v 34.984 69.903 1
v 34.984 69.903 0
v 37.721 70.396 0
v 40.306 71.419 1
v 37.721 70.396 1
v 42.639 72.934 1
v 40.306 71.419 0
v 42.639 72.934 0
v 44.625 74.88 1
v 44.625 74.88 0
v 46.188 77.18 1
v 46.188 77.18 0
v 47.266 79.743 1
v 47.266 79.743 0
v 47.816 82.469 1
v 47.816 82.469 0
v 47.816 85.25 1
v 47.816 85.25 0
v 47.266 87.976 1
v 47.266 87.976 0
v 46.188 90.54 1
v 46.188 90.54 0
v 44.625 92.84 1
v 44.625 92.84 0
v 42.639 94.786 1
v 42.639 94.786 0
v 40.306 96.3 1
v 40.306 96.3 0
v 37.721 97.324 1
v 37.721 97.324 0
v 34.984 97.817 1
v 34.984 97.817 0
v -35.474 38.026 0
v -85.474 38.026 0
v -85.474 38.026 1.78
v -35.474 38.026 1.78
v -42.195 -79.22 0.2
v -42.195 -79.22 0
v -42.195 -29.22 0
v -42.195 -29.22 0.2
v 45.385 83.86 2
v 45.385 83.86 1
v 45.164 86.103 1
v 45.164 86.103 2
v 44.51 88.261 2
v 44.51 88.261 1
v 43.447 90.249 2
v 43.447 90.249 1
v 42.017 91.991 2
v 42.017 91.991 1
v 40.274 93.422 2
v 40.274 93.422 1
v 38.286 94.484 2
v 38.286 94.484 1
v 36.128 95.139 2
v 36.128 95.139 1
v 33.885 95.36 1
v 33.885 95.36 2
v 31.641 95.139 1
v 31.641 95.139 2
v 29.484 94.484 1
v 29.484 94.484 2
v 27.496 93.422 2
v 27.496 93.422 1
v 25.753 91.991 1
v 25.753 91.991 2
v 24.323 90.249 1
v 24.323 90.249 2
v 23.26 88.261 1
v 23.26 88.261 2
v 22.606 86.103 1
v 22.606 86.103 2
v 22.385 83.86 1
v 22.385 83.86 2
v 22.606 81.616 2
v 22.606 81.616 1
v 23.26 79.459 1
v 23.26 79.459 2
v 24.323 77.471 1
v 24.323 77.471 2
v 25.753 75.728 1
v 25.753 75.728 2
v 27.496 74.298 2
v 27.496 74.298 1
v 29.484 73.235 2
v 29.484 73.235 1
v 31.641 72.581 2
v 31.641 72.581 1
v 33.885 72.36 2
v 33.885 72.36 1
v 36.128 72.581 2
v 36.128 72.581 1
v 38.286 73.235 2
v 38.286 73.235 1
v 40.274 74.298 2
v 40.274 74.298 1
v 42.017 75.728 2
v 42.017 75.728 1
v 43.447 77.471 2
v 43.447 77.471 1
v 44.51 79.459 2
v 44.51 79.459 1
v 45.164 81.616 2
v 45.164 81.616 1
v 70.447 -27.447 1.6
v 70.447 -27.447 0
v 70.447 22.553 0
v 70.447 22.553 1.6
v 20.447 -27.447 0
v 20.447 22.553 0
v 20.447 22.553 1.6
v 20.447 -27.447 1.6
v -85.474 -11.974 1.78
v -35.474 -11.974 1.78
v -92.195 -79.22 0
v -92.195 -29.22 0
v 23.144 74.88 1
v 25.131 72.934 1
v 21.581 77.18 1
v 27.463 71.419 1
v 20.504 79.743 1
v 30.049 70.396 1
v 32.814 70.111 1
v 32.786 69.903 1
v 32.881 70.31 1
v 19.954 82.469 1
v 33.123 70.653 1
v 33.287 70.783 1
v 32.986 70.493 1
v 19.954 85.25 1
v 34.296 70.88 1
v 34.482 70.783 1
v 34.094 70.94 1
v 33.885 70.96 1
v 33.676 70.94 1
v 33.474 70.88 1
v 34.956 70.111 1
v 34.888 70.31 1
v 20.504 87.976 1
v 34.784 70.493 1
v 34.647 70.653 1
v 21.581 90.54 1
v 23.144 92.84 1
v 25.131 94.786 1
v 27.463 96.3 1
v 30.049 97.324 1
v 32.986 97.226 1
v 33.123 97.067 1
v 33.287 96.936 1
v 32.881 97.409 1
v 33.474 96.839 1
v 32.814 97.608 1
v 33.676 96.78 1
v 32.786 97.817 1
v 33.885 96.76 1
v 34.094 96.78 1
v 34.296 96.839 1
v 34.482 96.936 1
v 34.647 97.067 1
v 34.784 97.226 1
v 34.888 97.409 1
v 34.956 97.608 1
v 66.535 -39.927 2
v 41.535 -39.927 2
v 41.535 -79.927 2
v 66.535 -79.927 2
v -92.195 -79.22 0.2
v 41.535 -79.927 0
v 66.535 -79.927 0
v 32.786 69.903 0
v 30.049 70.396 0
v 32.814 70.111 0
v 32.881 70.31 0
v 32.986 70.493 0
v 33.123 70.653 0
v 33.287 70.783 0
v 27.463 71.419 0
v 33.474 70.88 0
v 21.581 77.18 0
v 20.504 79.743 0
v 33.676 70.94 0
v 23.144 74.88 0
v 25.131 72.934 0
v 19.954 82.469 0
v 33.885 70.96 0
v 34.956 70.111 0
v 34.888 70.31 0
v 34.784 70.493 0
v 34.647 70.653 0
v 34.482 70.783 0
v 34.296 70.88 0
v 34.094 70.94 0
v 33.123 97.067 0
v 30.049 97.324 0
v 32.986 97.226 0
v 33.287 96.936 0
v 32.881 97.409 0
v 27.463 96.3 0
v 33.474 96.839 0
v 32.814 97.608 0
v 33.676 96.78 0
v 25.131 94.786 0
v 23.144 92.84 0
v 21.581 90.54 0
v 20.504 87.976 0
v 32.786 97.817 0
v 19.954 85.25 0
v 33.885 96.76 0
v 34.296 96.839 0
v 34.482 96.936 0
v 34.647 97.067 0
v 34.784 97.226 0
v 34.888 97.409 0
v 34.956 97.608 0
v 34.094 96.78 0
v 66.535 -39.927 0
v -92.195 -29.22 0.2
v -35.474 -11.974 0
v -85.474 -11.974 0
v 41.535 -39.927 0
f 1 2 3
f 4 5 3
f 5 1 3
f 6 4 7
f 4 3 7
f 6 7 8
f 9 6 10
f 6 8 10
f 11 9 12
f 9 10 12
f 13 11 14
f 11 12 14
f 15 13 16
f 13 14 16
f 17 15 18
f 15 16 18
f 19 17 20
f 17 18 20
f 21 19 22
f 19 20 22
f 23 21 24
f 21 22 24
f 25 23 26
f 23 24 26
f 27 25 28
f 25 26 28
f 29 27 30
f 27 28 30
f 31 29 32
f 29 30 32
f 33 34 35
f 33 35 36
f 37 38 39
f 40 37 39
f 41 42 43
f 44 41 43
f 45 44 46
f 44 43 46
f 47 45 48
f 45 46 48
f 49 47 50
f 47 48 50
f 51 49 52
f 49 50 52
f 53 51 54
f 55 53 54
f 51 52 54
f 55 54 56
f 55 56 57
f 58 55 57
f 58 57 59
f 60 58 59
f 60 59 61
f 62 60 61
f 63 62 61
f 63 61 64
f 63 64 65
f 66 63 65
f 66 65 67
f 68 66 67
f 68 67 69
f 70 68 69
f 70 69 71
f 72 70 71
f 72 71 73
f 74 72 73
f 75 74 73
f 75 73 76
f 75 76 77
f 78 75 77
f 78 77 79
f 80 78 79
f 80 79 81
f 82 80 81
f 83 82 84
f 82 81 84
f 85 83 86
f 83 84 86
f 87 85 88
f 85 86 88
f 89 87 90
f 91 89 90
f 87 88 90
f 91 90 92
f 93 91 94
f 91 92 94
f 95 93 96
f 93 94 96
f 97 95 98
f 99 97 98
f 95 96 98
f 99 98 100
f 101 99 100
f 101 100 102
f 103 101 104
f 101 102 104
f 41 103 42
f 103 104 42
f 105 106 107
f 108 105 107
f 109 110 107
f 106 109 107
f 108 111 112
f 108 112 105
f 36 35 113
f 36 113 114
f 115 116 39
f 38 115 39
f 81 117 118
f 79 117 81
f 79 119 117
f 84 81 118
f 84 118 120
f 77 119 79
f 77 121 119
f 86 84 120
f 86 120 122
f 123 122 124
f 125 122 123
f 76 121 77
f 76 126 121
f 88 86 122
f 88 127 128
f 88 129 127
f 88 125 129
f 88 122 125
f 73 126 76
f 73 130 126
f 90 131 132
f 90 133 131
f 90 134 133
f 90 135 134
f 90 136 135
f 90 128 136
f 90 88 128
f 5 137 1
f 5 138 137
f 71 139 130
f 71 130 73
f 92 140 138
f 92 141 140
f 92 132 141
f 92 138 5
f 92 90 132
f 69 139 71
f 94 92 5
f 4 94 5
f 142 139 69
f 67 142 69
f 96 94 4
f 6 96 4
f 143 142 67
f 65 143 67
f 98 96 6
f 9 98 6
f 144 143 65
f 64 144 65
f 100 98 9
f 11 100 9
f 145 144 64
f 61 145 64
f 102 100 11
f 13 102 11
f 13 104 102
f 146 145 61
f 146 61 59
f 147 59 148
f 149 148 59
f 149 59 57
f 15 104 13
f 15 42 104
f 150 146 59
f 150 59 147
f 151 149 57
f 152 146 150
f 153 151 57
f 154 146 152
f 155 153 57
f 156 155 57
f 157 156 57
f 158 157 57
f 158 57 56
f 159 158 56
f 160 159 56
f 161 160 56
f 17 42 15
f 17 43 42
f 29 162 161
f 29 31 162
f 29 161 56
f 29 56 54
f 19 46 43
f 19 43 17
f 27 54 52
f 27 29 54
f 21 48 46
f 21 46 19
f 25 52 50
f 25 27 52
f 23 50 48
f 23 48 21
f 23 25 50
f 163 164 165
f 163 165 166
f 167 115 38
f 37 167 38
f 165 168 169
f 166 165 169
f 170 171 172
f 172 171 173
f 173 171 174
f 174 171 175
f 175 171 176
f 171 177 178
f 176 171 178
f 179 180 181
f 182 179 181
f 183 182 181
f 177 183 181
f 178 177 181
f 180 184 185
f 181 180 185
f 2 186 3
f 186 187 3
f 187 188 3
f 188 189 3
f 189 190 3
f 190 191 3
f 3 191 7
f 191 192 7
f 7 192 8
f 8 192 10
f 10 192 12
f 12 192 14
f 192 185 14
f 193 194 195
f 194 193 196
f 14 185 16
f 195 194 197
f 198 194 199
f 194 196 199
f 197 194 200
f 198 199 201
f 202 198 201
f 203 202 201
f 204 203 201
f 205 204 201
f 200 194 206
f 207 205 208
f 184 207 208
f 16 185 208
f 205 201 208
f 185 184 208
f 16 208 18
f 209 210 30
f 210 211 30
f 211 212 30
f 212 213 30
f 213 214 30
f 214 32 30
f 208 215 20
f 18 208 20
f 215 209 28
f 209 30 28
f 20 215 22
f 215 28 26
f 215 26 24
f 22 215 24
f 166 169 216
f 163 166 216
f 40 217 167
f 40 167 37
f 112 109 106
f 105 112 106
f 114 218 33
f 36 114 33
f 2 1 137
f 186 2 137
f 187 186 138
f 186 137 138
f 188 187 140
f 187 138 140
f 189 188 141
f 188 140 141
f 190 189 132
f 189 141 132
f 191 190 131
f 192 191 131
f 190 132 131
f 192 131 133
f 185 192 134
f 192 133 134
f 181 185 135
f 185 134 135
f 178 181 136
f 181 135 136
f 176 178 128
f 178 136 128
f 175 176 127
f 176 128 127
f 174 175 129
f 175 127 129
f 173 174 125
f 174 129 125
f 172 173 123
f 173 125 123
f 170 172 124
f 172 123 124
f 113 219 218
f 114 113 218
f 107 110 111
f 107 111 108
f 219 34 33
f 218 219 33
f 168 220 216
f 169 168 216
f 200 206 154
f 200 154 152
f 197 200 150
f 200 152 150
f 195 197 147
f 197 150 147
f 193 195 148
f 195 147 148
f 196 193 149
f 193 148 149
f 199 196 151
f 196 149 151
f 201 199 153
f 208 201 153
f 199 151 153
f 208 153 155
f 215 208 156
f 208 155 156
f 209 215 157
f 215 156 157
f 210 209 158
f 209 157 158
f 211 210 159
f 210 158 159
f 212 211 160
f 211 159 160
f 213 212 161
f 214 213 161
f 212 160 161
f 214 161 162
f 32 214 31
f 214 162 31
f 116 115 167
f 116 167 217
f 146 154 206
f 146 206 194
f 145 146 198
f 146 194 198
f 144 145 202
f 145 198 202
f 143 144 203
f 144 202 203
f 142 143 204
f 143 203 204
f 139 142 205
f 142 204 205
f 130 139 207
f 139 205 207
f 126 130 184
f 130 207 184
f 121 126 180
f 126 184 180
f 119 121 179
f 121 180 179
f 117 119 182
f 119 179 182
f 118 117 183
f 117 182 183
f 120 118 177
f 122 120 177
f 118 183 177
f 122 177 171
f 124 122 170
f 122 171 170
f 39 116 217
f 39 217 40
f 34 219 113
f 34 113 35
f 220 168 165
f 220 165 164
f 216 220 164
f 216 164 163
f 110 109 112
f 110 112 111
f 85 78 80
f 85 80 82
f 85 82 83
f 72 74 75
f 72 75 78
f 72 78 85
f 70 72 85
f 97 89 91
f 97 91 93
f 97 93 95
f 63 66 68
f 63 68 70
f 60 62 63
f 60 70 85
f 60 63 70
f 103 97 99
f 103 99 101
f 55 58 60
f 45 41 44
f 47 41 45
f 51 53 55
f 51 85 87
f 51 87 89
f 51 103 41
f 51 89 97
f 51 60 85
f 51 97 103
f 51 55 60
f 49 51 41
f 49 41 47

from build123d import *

# Parameters (mm, degrees)
F0_W     = 50
F0_H     = 50
F1_DEPTH = 1.78
F2_DEPTH = 1.6
F3_DEPTH = 0.2
F0_W_2   = 25
F0_H_2   = 40
F4_DEPTH = 2
F0_R     = 11.5
F5_DEPTH = 2
F0_R_2   = 14
F6_DEPTH = 1
F7_D     = 2.2


with BuildPart() as f1:
    # F0 (on Top) → F1 (new body)
    with BuildSketch(Plane.XY):
        with Locations((-60.4736864567, 13.0263153464)):
            Rectangle(F0_W, F0_H)
    extrude(amount=F1_DEPTH)


with BuildPart() as f2:
    # F0 (on Top) → F2 (new body)
    with BuildSketch(Plane.XY):
        with Locations((45.4473696649, -2.4473689497)):
            Rectangle(F0_W, F0_H)
    extrude(amount=F2_DEPTH)


with BuildPart() as f3:
    # F0 (on Top) → F3 (new body)
    with BuildSketch(Plane.XY):
        with Locations((-67.1953260899, -54.2201809585)):
            Rectangle(F0_W, F0_H)
    extrude(amount=F3_DEPTH)


with BuildPart() as f4:
    # F0 (on Top) → F4 (new body)
    with BuildSketch(Plane.XY):
        with Locations((54.0352582932, -59.9272730947)):
            Rectangle(F0_W_2, F0_H_2)
    extrude(amount=F4_DEPTH)


with BuildPart() as f5:
    # F0 (on Top) → F5 (new body)
    with BuildSketch(Plane.XY):
        with Locations((33.884909004, 83.8597640395)):
            Circle(F0_R)
    extrude(amount=F5_DEPTH)

    # F0 (on Top) → F6 (join)
    with BuildSketch(Plane.XY):
        with Locations((33.884909004, 83.8597640395)):
            Circle(F0_R_2)
        with Locations((33.884909004, 83.8597640395)):
            Circle(F0_R, mode=Mode.SUBTRACT)
    extrude(amount=F6_DEPTH)

    # F7 (through all)
    with Locations(Plane(origin=(0, 0, 0), x_dir=(1, 0, 0), z_dir=(0, 0, -1))):
        with Locations((33.884909004, -97.8597640395), (33.884909004, -69.8597640395)):
            Hole(F7_D / 2)


solid = Compound([f1.part, f2.part, f3.part, f4.part, f5.part])
